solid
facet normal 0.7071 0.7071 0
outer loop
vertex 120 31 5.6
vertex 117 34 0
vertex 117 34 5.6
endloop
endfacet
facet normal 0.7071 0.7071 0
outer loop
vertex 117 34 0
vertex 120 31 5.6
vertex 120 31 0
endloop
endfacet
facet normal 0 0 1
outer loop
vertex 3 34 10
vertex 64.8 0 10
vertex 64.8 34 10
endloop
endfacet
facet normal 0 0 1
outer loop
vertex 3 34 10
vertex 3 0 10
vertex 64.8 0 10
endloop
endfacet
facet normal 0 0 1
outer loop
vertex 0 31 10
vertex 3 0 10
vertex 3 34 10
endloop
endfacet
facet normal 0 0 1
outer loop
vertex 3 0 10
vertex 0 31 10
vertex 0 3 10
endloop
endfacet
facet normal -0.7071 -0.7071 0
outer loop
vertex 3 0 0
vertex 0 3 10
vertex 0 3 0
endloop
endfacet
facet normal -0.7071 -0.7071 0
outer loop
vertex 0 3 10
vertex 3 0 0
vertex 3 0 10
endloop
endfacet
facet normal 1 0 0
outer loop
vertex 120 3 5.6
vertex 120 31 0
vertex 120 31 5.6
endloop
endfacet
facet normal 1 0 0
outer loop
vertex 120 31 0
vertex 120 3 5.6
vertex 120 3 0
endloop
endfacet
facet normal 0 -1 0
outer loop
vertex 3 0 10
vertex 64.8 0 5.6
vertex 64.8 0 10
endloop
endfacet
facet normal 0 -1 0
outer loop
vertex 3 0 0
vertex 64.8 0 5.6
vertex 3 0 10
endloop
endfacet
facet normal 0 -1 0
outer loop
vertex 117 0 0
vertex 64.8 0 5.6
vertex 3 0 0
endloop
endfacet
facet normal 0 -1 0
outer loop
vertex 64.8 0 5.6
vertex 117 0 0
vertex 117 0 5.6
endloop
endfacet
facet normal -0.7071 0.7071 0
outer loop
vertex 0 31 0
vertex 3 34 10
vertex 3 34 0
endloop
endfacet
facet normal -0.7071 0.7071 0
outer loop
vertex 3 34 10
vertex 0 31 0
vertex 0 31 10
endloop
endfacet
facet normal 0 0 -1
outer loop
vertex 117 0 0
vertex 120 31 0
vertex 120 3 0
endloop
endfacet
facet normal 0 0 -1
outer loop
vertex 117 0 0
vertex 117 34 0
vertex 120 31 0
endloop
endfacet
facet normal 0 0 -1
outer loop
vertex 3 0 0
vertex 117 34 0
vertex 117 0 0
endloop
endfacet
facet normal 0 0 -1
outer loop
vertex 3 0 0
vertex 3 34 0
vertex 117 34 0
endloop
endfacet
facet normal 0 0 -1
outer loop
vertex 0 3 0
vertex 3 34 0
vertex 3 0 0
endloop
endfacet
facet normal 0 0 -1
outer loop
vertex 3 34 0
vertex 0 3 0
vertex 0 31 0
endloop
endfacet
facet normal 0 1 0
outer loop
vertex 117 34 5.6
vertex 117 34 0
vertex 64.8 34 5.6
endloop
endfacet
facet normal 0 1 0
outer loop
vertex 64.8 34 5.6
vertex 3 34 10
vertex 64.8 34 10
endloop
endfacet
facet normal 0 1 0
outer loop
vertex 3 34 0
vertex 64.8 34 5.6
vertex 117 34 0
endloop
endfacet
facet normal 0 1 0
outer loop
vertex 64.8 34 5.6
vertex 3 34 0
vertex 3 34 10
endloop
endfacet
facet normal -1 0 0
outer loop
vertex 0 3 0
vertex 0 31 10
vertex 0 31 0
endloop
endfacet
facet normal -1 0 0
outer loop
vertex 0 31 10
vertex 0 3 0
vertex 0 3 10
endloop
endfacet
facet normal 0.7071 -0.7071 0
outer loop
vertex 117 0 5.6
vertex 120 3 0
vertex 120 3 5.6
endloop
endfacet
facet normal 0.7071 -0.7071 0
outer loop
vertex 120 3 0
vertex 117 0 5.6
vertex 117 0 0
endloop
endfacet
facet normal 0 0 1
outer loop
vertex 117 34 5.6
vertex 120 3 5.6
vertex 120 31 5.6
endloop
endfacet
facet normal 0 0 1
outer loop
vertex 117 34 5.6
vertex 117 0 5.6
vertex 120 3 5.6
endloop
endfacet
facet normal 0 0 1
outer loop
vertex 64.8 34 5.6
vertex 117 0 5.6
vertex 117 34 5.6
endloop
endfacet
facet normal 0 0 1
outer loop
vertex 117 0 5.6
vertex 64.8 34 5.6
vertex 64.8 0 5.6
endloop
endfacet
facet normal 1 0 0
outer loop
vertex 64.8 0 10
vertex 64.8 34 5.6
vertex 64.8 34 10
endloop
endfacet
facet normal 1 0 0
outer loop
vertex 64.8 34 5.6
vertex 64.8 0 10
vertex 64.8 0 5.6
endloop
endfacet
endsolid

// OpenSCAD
$fn = 32;

// ----------------------------------------------------------------------
// Stepped bar: endstep, 120 x 34 x 10/5.6 mm
// ----------------------------------------------------------------------

// --- parameters (mm) ---
bar_l = 120;              // bar length, X
bar_w = 34;               // bar width, Y
plate_t = 10;             // thickness of the thick zone, Z
thin_t = 5.6;             // thickness of the thin zone
corner_c = 3;             // corner chamfer of the bar
step_cut = 4.4;           // material removed from the thin zone
step_x = 64.8;            // step position from the left end
depth_1 = 4.4;            // depth of cut 1 from the top face

profile = [[3, 0], [117, 0], [120, 3], [120, 31], [117, 34], [3, 34], [0, 31], [0, 3]];  // primary outline, 8 points, counter clockwise
void_1 = [[64.8, -1], [121, -1], [121, 35], [64.8, 35]];  // thin zone beyond the step, 4 points

// --- the one profile operation ---
difference() {
  linear_extrude(height = plate_t) polygon(points = profile);
  translate([0, 0, plate_t - depth_1])
    linear_extrude(height = depth_1 + 1) polygon(points = void_1);
}
